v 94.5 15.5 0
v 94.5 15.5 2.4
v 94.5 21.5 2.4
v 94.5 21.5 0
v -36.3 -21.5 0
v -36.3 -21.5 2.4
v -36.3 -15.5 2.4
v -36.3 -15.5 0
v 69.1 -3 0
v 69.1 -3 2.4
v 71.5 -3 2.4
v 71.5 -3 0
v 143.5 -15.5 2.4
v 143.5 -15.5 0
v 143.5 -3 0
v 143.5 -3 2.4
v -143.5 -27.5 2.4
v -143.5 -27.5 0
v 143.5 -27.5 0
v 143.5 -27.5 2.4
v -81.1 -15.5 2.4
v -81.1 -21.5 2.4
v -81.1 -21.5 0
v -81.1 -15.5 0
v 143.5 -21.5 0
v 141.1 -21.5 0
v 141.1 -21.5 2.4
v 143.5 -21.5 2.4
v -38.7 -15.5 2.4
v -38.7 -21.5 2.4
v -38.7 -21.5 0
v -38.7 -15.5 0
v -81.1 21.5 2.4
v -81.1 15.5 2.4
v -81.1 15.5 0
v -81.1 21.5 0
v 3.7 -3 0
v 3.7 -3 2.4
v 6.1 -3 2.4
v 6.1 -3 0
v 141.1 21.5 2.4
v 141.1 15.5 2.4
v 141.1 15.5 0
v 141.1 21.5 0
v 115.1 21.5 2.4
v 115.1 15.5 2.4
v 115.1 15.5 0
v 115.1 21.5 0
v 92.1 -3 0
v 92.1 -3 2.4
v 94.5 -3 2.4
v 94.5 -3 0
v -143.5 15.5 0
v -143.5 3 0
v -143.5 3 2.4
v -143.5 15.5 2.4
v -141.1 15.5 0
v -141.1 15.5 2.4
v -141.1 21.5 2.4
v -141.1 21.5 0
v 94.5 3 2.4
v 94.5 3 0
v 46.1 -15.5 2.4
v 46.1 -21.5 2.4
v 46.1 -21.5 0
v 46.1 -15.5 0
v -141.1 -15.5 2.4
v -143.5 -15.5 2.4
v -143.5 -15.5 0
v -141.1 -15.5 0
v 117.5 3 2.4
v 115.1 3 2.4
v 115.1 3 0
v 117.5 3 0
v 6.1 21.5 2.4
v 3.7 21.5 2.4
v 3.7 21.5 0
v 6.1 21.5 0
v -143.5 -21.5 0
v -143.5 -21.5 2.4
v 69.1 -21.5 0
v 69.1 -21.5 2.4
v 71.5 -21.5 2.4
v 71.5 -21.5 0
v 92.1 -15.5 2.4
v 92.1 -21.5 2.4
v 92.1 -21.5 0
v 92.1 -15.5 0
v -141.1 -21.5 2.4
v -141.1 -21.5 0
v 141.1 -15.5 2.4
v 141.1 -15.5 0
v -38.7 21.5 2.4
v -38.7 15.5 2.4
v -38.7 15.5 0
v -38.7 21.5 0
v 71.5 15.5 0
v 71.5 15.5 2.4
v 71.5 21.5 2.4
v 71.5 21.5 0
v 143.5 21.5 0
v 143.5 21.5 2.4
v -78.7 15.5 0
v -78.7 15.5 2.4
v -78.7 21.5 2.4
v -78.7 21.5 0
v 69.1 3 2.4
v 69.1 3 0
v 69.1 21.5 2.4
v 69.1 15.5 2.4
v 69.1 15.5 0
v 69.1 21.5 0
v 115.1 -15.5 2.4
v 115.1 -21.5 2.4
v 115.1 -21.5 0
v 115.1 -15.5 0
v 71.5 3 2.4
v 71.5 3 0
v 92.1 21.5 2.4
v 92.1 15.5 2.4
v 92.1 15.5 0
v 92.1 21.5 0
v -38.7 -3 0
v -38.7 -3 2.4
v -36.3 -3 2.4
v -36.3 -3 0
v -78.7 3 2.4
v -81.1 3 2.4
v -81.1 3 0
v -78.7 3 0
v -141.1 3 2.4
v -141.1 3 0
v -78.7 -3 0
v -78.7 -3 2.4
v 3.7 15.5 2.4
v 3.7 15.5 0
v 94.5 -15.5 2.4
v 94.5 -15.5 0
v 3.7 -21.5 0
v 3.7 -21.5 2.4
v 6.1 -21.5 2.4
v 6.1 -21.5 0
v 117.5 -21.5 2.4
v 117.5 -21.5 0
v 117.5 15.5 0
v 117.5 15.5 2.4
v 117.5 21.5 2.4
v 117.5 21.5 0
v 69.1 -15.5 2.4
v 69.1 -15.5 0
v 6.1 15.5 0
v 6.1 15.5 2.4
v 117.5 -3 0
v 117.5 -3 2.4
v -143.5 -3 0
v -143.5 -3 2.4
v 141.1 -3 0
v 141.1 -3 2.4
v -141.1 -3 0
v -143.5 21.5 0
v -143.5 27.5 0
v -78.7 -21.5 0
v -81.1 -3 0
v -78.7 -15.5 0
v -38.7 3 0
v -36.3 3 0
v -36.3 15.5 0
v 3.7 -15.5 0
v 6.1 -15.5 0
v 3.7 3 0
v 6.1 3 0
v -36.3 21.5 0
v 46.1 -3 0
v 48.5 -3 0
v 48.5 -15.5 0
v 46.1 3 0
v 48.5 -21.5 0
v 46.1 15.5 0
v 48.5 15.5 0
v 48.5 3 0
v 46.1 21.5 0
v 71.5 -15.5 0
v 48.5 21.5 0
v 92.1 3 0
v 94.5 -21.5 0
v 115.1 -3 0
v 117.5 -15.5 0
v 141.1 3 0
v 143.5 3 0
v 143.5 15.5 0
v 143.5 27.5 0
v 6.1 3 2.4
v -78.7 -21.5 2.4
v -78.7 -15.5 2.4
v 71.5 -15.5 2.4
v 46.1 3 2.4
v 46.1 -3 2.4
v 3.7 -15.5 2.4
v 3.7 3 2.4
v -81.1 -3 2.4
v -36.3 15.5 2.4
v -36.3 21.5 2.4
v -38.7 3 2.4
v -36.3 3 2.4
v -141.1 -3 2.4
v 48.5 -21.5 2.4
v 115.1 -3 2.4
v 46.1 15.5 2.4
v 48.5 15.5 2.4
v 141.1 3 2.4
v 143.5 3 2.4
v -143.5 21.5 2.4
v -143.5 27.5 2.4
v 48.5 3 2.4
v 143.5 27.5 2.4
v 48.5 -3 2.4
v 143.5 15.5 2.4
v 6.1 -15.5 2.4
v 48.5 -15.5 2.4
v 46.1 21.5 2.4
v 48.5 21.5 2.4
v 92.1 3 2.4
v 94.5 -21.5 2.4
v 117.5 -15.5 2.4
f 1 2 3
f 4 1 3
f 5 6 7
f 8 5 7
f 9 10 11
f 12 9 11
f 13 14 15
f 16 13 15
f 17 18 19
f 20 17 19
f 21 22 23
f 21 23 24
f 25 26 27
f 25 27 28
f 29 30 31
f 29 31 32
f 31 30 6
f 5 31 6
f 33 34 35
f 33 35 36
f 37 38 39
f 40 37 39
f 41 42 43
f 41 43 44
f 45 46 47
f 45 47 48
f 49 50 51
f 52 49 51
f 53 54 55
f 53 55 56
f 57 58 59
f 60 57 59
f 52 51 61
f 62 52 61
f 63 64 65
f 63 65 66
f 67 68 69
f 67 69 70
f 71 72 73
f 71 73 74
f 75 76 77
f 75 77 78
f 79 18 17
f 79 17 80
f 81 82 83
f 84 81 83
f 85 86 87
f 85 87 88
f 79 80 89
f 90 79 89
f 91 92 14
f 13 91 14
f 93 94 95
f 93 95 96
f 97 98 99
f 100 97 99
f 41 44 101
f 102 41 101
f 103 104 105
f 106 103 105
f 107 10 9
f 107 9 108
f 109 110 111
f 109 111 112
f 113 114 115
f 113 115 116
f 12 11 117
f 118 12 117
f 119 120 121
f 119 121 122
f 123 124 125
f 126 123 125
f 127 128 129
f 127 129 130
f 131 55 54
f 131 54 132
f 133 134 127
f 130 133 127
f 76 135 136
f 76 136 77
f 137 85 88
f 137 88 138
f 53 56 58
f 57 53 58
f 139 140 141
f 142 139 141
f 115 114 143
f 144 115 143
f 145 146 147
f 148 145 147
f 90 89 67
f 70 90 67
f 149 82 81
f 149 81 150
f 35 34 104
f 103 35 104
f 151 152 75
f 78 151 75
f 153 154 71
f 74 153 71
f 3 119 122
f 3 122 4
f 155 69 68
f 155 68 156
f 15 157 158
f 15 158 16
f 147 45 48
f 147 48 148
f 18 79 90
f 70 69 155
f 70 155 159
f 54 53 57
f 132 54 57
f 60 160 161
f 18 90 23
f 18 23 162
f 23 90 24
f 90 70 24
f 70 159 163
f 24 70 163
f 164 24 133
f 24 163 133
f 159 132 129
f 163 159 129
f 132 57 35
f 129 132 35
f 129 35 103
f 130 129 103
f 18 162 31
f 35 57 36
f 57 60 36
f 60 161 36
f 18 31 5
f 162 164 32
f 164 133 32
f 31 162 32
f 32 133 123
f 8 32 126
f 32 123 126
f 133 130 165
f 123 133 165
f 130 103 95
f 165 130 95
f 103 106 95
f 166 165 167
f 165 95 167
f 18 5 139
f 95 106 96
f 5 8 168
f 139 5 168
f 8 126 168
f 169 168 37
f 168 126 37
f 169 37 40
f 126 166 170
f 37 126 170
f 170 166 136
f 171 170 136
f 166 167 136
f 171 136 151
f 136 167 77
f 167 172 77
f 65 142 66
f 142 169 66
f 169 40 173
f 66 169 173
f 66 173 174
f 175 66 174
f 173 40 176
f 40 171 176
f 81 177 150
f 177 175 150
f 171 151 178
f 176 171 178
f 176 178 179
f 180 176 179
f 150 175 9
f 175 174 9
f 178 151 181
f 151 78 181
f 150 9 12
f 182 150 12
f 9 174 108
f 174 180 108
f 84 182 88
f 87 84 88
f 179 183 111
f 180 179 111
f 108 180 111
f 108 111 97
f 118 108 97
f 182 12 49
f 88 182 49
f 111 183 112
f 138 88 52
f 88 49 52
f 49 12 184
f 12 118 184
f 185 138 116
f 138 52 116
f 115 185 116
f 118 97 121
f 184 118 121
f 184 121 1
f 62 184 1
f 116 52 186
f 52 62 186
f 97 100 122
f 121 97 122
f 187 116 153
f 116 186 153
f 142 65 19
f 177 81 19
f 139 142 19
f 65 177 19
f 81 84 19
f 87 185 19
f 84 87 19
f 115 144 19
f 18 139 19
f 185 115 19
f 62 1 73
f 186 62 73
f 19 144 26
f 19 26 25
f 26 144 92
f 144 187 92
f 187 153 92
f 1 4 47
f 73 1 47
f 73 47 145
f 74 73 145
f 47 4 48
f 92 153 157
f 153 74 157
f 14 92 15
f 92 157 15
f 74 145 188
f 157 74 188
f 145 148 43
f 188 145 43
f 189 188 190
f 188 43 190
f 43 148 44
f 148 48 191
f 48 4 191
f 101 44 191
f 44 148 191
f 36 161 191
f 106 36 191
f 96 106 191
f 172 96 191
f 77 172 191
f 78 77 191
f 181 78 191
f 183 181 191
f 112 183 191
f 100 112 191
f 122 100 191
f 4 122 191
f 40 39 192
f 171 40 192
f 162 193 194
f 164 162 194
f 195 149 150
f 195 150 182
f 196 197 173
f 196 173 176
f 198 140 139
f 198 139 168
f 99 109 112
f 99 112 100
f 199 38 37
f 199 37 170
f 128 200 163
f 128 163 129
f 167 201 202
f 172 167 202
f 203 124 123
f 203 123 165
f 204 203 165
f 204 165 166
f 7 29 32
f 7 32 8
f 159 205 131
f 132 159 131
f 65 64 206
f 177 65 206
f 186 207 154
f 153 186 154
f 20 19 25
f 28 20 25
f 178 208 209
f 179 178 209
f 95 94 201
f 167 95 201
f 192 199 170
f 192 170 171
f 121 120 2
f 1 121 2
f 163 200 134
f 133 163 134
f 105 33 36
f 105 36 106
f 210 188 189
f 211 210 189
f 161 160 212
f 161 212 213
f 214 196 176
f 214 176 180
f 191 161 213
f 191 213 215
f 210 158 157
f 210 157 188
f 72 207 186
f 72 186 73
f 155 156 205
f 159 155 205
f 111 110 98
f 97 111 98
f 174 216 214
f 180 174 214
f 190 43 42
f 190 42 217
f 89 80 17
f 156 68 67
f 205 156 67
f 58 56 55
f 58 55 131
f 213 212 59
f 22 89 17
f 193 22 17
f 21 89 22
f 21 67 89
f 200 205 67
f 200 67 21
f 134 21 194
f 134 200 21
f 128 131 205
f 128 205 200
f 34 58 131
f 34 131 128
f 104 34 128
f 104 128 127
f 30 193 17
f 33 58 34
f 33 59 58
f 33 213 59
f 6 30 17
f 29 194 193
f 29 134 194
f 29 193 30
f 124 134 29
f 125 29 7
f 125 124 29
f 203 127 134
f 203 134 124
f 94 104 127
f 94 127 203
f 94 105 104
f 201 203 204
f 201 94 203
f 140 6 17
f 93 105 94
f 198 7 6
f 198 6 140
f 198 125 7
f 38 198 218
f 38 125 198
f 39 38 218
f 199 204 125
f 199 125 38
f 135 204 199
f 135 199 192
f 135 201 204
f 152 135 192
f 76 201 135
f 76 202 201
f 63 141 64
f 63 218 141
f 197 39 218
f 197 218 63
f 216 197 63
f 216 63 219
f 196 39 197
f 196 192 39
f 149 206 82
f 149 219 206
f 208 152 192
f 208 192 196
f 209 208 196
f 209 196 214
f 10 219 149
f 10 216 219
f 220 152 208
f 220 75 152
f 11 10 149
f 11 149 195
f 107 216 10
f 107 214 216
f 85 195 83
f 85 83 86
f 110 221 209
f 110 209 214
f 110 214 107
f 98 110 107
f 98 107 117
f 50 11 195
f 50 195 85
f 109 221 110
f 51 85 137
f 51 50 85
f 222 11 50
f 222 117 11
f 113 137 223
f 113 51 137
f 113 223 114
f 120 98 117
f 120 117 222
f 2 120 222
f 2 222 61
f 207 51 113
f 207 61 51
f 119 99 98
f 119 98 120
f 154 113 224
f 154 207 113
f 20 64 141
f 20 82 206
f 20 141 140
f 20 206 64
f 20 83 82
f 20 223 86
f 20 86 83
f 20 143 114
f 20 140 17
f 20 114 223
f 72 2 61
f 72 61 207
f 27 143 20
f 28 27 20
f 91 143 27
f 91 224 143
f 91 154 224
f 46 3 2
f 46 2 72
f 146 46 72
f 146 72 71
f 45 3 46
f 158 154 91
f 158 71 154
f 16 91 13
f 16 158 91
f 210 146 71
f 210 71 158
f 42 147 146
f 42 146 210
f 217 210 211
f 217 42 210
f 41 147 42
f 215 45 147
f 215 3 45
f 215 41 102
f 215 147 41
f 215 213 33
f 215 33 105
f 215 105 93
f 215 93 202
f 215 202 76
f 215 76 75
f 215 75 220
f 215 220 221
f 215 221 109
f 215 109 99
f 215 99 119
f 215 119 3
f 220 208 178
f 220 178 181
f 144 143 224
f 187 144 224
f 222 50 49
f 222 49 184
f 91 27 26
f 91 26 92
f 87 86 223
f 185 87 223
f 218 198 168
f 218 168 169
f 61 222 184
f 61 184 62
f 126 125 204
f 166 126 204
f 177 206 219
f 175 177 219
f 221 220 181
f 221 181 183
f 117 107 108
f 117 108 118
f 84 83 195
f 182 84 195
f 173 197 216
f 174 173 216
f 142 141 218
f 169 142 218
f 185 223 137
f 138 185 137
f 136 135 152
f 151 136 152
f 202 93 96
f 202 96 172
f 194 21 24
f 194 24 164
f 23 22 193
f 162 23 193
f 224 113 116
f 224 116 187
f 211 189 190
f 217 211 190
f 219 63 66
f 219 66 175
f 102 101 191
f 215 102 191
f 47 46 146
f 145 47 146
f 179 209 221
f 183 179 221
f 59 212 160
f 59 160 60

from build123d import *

# Parameters (mm, degrees)
F0_W     = 287
F0_H     = 55
F1_DEPTH = 2.4
F2_W     = 2.4
F2_H     = 6
F3_DEPTH = 2.401


with BuildPart() as f1:
    # F0 (on Top) → F1 (new body)
    with BuildSketch(Plane.XY):
        Rectangle(F0_W, F0_H)
    extrude(amount=F1_DEPTH)

    # F2 (on face) → F3 (cut, through all)
    with BuildSketch(Plane.XY.offset(2.4)):
        with Locations((-142.3, 0)):
            Rectangle(F2_W, F2_H)
        with Locations((-142.3, -18.5)):
            Rectangle(F2_W, F2_H)
        with Locations((-142.3, 18.5)):
            Rectangle(F2_W, F2_H)
        with Locations((-79.9, 18.5)):
            Rectangle(F2_W, F2_H)
        with Locations((-79.9, 0)):
            Rectangle(F2_W, F2_H)
        with Locations((-79.9, -18.5)):
            Rectangle(F2_W, F2_H)
        with Locations((-37.5, -18.5)):
            Rectangle(F2_W, F2_H)
        with Locations((-37.5, 0)):
            Rectangle(F2_W, F2_H)
        with Locations((-37.5, 18.5)):
            Rectangle(F2_W, F2_H)
        with Locations((4.9, 18.5)):
            Rectangle(F2_W, F2_H)
        with Locations((4.9, 0)):
            Rectangle(F2_W, F2_H)
        with Locations((4.9, -18.5)):
            Rectangle(F2_W, F2_H)
        with Locations((47.3, -18.5)):
            Rectangle(F2_W, F2_H)
        with Locations((47.3, 0)):
            Rectangle(F2_W, F2_H)
        with Locations((47.3, 18.5)):
            Rectangle(F2_W, F2_H)
        with Locations((70.3, 18.5)):
            Rectangle(F2_W, F2_H)
        with Locations((70.3, 0)):
            Rectangle(F2_W, F2_H)
        with Locations((70.3, -18.5)):
            Rectangle(F2_W, F2_H)
        with Locations((93.3, -18.5)):
            Rectangle(F2_W, F2_H)
        with Locations((93.3, 0)):
            Rectangle(F2_W, F2_H)
        with Locations((93.3, 18.5)):
            Rectangle(F2_W, F2_H)
        with Locations((116.3, 18.5)):
            Rectangle(F2_W, F2_H)
        with Locations((116.3, 0)):
            Rectangle(F2_W, F2_H)
        with Locations((116.3, -18.5)):
            Rectangle(F2_W, F2_H)
        with Locations((142.3, 18.5)):
            Rectangle(F2_W, F2_H)
        with Locations((142.3, 0)):
            Rectangle(F2_W, F2_H)
        with Locations((142.3, -18.5)):
            Rectangle(F2_W, F2_H)
    extrude(amount=-F3_DEPTH, mode=Mode.SUBTRACT)


solid = f1.part
